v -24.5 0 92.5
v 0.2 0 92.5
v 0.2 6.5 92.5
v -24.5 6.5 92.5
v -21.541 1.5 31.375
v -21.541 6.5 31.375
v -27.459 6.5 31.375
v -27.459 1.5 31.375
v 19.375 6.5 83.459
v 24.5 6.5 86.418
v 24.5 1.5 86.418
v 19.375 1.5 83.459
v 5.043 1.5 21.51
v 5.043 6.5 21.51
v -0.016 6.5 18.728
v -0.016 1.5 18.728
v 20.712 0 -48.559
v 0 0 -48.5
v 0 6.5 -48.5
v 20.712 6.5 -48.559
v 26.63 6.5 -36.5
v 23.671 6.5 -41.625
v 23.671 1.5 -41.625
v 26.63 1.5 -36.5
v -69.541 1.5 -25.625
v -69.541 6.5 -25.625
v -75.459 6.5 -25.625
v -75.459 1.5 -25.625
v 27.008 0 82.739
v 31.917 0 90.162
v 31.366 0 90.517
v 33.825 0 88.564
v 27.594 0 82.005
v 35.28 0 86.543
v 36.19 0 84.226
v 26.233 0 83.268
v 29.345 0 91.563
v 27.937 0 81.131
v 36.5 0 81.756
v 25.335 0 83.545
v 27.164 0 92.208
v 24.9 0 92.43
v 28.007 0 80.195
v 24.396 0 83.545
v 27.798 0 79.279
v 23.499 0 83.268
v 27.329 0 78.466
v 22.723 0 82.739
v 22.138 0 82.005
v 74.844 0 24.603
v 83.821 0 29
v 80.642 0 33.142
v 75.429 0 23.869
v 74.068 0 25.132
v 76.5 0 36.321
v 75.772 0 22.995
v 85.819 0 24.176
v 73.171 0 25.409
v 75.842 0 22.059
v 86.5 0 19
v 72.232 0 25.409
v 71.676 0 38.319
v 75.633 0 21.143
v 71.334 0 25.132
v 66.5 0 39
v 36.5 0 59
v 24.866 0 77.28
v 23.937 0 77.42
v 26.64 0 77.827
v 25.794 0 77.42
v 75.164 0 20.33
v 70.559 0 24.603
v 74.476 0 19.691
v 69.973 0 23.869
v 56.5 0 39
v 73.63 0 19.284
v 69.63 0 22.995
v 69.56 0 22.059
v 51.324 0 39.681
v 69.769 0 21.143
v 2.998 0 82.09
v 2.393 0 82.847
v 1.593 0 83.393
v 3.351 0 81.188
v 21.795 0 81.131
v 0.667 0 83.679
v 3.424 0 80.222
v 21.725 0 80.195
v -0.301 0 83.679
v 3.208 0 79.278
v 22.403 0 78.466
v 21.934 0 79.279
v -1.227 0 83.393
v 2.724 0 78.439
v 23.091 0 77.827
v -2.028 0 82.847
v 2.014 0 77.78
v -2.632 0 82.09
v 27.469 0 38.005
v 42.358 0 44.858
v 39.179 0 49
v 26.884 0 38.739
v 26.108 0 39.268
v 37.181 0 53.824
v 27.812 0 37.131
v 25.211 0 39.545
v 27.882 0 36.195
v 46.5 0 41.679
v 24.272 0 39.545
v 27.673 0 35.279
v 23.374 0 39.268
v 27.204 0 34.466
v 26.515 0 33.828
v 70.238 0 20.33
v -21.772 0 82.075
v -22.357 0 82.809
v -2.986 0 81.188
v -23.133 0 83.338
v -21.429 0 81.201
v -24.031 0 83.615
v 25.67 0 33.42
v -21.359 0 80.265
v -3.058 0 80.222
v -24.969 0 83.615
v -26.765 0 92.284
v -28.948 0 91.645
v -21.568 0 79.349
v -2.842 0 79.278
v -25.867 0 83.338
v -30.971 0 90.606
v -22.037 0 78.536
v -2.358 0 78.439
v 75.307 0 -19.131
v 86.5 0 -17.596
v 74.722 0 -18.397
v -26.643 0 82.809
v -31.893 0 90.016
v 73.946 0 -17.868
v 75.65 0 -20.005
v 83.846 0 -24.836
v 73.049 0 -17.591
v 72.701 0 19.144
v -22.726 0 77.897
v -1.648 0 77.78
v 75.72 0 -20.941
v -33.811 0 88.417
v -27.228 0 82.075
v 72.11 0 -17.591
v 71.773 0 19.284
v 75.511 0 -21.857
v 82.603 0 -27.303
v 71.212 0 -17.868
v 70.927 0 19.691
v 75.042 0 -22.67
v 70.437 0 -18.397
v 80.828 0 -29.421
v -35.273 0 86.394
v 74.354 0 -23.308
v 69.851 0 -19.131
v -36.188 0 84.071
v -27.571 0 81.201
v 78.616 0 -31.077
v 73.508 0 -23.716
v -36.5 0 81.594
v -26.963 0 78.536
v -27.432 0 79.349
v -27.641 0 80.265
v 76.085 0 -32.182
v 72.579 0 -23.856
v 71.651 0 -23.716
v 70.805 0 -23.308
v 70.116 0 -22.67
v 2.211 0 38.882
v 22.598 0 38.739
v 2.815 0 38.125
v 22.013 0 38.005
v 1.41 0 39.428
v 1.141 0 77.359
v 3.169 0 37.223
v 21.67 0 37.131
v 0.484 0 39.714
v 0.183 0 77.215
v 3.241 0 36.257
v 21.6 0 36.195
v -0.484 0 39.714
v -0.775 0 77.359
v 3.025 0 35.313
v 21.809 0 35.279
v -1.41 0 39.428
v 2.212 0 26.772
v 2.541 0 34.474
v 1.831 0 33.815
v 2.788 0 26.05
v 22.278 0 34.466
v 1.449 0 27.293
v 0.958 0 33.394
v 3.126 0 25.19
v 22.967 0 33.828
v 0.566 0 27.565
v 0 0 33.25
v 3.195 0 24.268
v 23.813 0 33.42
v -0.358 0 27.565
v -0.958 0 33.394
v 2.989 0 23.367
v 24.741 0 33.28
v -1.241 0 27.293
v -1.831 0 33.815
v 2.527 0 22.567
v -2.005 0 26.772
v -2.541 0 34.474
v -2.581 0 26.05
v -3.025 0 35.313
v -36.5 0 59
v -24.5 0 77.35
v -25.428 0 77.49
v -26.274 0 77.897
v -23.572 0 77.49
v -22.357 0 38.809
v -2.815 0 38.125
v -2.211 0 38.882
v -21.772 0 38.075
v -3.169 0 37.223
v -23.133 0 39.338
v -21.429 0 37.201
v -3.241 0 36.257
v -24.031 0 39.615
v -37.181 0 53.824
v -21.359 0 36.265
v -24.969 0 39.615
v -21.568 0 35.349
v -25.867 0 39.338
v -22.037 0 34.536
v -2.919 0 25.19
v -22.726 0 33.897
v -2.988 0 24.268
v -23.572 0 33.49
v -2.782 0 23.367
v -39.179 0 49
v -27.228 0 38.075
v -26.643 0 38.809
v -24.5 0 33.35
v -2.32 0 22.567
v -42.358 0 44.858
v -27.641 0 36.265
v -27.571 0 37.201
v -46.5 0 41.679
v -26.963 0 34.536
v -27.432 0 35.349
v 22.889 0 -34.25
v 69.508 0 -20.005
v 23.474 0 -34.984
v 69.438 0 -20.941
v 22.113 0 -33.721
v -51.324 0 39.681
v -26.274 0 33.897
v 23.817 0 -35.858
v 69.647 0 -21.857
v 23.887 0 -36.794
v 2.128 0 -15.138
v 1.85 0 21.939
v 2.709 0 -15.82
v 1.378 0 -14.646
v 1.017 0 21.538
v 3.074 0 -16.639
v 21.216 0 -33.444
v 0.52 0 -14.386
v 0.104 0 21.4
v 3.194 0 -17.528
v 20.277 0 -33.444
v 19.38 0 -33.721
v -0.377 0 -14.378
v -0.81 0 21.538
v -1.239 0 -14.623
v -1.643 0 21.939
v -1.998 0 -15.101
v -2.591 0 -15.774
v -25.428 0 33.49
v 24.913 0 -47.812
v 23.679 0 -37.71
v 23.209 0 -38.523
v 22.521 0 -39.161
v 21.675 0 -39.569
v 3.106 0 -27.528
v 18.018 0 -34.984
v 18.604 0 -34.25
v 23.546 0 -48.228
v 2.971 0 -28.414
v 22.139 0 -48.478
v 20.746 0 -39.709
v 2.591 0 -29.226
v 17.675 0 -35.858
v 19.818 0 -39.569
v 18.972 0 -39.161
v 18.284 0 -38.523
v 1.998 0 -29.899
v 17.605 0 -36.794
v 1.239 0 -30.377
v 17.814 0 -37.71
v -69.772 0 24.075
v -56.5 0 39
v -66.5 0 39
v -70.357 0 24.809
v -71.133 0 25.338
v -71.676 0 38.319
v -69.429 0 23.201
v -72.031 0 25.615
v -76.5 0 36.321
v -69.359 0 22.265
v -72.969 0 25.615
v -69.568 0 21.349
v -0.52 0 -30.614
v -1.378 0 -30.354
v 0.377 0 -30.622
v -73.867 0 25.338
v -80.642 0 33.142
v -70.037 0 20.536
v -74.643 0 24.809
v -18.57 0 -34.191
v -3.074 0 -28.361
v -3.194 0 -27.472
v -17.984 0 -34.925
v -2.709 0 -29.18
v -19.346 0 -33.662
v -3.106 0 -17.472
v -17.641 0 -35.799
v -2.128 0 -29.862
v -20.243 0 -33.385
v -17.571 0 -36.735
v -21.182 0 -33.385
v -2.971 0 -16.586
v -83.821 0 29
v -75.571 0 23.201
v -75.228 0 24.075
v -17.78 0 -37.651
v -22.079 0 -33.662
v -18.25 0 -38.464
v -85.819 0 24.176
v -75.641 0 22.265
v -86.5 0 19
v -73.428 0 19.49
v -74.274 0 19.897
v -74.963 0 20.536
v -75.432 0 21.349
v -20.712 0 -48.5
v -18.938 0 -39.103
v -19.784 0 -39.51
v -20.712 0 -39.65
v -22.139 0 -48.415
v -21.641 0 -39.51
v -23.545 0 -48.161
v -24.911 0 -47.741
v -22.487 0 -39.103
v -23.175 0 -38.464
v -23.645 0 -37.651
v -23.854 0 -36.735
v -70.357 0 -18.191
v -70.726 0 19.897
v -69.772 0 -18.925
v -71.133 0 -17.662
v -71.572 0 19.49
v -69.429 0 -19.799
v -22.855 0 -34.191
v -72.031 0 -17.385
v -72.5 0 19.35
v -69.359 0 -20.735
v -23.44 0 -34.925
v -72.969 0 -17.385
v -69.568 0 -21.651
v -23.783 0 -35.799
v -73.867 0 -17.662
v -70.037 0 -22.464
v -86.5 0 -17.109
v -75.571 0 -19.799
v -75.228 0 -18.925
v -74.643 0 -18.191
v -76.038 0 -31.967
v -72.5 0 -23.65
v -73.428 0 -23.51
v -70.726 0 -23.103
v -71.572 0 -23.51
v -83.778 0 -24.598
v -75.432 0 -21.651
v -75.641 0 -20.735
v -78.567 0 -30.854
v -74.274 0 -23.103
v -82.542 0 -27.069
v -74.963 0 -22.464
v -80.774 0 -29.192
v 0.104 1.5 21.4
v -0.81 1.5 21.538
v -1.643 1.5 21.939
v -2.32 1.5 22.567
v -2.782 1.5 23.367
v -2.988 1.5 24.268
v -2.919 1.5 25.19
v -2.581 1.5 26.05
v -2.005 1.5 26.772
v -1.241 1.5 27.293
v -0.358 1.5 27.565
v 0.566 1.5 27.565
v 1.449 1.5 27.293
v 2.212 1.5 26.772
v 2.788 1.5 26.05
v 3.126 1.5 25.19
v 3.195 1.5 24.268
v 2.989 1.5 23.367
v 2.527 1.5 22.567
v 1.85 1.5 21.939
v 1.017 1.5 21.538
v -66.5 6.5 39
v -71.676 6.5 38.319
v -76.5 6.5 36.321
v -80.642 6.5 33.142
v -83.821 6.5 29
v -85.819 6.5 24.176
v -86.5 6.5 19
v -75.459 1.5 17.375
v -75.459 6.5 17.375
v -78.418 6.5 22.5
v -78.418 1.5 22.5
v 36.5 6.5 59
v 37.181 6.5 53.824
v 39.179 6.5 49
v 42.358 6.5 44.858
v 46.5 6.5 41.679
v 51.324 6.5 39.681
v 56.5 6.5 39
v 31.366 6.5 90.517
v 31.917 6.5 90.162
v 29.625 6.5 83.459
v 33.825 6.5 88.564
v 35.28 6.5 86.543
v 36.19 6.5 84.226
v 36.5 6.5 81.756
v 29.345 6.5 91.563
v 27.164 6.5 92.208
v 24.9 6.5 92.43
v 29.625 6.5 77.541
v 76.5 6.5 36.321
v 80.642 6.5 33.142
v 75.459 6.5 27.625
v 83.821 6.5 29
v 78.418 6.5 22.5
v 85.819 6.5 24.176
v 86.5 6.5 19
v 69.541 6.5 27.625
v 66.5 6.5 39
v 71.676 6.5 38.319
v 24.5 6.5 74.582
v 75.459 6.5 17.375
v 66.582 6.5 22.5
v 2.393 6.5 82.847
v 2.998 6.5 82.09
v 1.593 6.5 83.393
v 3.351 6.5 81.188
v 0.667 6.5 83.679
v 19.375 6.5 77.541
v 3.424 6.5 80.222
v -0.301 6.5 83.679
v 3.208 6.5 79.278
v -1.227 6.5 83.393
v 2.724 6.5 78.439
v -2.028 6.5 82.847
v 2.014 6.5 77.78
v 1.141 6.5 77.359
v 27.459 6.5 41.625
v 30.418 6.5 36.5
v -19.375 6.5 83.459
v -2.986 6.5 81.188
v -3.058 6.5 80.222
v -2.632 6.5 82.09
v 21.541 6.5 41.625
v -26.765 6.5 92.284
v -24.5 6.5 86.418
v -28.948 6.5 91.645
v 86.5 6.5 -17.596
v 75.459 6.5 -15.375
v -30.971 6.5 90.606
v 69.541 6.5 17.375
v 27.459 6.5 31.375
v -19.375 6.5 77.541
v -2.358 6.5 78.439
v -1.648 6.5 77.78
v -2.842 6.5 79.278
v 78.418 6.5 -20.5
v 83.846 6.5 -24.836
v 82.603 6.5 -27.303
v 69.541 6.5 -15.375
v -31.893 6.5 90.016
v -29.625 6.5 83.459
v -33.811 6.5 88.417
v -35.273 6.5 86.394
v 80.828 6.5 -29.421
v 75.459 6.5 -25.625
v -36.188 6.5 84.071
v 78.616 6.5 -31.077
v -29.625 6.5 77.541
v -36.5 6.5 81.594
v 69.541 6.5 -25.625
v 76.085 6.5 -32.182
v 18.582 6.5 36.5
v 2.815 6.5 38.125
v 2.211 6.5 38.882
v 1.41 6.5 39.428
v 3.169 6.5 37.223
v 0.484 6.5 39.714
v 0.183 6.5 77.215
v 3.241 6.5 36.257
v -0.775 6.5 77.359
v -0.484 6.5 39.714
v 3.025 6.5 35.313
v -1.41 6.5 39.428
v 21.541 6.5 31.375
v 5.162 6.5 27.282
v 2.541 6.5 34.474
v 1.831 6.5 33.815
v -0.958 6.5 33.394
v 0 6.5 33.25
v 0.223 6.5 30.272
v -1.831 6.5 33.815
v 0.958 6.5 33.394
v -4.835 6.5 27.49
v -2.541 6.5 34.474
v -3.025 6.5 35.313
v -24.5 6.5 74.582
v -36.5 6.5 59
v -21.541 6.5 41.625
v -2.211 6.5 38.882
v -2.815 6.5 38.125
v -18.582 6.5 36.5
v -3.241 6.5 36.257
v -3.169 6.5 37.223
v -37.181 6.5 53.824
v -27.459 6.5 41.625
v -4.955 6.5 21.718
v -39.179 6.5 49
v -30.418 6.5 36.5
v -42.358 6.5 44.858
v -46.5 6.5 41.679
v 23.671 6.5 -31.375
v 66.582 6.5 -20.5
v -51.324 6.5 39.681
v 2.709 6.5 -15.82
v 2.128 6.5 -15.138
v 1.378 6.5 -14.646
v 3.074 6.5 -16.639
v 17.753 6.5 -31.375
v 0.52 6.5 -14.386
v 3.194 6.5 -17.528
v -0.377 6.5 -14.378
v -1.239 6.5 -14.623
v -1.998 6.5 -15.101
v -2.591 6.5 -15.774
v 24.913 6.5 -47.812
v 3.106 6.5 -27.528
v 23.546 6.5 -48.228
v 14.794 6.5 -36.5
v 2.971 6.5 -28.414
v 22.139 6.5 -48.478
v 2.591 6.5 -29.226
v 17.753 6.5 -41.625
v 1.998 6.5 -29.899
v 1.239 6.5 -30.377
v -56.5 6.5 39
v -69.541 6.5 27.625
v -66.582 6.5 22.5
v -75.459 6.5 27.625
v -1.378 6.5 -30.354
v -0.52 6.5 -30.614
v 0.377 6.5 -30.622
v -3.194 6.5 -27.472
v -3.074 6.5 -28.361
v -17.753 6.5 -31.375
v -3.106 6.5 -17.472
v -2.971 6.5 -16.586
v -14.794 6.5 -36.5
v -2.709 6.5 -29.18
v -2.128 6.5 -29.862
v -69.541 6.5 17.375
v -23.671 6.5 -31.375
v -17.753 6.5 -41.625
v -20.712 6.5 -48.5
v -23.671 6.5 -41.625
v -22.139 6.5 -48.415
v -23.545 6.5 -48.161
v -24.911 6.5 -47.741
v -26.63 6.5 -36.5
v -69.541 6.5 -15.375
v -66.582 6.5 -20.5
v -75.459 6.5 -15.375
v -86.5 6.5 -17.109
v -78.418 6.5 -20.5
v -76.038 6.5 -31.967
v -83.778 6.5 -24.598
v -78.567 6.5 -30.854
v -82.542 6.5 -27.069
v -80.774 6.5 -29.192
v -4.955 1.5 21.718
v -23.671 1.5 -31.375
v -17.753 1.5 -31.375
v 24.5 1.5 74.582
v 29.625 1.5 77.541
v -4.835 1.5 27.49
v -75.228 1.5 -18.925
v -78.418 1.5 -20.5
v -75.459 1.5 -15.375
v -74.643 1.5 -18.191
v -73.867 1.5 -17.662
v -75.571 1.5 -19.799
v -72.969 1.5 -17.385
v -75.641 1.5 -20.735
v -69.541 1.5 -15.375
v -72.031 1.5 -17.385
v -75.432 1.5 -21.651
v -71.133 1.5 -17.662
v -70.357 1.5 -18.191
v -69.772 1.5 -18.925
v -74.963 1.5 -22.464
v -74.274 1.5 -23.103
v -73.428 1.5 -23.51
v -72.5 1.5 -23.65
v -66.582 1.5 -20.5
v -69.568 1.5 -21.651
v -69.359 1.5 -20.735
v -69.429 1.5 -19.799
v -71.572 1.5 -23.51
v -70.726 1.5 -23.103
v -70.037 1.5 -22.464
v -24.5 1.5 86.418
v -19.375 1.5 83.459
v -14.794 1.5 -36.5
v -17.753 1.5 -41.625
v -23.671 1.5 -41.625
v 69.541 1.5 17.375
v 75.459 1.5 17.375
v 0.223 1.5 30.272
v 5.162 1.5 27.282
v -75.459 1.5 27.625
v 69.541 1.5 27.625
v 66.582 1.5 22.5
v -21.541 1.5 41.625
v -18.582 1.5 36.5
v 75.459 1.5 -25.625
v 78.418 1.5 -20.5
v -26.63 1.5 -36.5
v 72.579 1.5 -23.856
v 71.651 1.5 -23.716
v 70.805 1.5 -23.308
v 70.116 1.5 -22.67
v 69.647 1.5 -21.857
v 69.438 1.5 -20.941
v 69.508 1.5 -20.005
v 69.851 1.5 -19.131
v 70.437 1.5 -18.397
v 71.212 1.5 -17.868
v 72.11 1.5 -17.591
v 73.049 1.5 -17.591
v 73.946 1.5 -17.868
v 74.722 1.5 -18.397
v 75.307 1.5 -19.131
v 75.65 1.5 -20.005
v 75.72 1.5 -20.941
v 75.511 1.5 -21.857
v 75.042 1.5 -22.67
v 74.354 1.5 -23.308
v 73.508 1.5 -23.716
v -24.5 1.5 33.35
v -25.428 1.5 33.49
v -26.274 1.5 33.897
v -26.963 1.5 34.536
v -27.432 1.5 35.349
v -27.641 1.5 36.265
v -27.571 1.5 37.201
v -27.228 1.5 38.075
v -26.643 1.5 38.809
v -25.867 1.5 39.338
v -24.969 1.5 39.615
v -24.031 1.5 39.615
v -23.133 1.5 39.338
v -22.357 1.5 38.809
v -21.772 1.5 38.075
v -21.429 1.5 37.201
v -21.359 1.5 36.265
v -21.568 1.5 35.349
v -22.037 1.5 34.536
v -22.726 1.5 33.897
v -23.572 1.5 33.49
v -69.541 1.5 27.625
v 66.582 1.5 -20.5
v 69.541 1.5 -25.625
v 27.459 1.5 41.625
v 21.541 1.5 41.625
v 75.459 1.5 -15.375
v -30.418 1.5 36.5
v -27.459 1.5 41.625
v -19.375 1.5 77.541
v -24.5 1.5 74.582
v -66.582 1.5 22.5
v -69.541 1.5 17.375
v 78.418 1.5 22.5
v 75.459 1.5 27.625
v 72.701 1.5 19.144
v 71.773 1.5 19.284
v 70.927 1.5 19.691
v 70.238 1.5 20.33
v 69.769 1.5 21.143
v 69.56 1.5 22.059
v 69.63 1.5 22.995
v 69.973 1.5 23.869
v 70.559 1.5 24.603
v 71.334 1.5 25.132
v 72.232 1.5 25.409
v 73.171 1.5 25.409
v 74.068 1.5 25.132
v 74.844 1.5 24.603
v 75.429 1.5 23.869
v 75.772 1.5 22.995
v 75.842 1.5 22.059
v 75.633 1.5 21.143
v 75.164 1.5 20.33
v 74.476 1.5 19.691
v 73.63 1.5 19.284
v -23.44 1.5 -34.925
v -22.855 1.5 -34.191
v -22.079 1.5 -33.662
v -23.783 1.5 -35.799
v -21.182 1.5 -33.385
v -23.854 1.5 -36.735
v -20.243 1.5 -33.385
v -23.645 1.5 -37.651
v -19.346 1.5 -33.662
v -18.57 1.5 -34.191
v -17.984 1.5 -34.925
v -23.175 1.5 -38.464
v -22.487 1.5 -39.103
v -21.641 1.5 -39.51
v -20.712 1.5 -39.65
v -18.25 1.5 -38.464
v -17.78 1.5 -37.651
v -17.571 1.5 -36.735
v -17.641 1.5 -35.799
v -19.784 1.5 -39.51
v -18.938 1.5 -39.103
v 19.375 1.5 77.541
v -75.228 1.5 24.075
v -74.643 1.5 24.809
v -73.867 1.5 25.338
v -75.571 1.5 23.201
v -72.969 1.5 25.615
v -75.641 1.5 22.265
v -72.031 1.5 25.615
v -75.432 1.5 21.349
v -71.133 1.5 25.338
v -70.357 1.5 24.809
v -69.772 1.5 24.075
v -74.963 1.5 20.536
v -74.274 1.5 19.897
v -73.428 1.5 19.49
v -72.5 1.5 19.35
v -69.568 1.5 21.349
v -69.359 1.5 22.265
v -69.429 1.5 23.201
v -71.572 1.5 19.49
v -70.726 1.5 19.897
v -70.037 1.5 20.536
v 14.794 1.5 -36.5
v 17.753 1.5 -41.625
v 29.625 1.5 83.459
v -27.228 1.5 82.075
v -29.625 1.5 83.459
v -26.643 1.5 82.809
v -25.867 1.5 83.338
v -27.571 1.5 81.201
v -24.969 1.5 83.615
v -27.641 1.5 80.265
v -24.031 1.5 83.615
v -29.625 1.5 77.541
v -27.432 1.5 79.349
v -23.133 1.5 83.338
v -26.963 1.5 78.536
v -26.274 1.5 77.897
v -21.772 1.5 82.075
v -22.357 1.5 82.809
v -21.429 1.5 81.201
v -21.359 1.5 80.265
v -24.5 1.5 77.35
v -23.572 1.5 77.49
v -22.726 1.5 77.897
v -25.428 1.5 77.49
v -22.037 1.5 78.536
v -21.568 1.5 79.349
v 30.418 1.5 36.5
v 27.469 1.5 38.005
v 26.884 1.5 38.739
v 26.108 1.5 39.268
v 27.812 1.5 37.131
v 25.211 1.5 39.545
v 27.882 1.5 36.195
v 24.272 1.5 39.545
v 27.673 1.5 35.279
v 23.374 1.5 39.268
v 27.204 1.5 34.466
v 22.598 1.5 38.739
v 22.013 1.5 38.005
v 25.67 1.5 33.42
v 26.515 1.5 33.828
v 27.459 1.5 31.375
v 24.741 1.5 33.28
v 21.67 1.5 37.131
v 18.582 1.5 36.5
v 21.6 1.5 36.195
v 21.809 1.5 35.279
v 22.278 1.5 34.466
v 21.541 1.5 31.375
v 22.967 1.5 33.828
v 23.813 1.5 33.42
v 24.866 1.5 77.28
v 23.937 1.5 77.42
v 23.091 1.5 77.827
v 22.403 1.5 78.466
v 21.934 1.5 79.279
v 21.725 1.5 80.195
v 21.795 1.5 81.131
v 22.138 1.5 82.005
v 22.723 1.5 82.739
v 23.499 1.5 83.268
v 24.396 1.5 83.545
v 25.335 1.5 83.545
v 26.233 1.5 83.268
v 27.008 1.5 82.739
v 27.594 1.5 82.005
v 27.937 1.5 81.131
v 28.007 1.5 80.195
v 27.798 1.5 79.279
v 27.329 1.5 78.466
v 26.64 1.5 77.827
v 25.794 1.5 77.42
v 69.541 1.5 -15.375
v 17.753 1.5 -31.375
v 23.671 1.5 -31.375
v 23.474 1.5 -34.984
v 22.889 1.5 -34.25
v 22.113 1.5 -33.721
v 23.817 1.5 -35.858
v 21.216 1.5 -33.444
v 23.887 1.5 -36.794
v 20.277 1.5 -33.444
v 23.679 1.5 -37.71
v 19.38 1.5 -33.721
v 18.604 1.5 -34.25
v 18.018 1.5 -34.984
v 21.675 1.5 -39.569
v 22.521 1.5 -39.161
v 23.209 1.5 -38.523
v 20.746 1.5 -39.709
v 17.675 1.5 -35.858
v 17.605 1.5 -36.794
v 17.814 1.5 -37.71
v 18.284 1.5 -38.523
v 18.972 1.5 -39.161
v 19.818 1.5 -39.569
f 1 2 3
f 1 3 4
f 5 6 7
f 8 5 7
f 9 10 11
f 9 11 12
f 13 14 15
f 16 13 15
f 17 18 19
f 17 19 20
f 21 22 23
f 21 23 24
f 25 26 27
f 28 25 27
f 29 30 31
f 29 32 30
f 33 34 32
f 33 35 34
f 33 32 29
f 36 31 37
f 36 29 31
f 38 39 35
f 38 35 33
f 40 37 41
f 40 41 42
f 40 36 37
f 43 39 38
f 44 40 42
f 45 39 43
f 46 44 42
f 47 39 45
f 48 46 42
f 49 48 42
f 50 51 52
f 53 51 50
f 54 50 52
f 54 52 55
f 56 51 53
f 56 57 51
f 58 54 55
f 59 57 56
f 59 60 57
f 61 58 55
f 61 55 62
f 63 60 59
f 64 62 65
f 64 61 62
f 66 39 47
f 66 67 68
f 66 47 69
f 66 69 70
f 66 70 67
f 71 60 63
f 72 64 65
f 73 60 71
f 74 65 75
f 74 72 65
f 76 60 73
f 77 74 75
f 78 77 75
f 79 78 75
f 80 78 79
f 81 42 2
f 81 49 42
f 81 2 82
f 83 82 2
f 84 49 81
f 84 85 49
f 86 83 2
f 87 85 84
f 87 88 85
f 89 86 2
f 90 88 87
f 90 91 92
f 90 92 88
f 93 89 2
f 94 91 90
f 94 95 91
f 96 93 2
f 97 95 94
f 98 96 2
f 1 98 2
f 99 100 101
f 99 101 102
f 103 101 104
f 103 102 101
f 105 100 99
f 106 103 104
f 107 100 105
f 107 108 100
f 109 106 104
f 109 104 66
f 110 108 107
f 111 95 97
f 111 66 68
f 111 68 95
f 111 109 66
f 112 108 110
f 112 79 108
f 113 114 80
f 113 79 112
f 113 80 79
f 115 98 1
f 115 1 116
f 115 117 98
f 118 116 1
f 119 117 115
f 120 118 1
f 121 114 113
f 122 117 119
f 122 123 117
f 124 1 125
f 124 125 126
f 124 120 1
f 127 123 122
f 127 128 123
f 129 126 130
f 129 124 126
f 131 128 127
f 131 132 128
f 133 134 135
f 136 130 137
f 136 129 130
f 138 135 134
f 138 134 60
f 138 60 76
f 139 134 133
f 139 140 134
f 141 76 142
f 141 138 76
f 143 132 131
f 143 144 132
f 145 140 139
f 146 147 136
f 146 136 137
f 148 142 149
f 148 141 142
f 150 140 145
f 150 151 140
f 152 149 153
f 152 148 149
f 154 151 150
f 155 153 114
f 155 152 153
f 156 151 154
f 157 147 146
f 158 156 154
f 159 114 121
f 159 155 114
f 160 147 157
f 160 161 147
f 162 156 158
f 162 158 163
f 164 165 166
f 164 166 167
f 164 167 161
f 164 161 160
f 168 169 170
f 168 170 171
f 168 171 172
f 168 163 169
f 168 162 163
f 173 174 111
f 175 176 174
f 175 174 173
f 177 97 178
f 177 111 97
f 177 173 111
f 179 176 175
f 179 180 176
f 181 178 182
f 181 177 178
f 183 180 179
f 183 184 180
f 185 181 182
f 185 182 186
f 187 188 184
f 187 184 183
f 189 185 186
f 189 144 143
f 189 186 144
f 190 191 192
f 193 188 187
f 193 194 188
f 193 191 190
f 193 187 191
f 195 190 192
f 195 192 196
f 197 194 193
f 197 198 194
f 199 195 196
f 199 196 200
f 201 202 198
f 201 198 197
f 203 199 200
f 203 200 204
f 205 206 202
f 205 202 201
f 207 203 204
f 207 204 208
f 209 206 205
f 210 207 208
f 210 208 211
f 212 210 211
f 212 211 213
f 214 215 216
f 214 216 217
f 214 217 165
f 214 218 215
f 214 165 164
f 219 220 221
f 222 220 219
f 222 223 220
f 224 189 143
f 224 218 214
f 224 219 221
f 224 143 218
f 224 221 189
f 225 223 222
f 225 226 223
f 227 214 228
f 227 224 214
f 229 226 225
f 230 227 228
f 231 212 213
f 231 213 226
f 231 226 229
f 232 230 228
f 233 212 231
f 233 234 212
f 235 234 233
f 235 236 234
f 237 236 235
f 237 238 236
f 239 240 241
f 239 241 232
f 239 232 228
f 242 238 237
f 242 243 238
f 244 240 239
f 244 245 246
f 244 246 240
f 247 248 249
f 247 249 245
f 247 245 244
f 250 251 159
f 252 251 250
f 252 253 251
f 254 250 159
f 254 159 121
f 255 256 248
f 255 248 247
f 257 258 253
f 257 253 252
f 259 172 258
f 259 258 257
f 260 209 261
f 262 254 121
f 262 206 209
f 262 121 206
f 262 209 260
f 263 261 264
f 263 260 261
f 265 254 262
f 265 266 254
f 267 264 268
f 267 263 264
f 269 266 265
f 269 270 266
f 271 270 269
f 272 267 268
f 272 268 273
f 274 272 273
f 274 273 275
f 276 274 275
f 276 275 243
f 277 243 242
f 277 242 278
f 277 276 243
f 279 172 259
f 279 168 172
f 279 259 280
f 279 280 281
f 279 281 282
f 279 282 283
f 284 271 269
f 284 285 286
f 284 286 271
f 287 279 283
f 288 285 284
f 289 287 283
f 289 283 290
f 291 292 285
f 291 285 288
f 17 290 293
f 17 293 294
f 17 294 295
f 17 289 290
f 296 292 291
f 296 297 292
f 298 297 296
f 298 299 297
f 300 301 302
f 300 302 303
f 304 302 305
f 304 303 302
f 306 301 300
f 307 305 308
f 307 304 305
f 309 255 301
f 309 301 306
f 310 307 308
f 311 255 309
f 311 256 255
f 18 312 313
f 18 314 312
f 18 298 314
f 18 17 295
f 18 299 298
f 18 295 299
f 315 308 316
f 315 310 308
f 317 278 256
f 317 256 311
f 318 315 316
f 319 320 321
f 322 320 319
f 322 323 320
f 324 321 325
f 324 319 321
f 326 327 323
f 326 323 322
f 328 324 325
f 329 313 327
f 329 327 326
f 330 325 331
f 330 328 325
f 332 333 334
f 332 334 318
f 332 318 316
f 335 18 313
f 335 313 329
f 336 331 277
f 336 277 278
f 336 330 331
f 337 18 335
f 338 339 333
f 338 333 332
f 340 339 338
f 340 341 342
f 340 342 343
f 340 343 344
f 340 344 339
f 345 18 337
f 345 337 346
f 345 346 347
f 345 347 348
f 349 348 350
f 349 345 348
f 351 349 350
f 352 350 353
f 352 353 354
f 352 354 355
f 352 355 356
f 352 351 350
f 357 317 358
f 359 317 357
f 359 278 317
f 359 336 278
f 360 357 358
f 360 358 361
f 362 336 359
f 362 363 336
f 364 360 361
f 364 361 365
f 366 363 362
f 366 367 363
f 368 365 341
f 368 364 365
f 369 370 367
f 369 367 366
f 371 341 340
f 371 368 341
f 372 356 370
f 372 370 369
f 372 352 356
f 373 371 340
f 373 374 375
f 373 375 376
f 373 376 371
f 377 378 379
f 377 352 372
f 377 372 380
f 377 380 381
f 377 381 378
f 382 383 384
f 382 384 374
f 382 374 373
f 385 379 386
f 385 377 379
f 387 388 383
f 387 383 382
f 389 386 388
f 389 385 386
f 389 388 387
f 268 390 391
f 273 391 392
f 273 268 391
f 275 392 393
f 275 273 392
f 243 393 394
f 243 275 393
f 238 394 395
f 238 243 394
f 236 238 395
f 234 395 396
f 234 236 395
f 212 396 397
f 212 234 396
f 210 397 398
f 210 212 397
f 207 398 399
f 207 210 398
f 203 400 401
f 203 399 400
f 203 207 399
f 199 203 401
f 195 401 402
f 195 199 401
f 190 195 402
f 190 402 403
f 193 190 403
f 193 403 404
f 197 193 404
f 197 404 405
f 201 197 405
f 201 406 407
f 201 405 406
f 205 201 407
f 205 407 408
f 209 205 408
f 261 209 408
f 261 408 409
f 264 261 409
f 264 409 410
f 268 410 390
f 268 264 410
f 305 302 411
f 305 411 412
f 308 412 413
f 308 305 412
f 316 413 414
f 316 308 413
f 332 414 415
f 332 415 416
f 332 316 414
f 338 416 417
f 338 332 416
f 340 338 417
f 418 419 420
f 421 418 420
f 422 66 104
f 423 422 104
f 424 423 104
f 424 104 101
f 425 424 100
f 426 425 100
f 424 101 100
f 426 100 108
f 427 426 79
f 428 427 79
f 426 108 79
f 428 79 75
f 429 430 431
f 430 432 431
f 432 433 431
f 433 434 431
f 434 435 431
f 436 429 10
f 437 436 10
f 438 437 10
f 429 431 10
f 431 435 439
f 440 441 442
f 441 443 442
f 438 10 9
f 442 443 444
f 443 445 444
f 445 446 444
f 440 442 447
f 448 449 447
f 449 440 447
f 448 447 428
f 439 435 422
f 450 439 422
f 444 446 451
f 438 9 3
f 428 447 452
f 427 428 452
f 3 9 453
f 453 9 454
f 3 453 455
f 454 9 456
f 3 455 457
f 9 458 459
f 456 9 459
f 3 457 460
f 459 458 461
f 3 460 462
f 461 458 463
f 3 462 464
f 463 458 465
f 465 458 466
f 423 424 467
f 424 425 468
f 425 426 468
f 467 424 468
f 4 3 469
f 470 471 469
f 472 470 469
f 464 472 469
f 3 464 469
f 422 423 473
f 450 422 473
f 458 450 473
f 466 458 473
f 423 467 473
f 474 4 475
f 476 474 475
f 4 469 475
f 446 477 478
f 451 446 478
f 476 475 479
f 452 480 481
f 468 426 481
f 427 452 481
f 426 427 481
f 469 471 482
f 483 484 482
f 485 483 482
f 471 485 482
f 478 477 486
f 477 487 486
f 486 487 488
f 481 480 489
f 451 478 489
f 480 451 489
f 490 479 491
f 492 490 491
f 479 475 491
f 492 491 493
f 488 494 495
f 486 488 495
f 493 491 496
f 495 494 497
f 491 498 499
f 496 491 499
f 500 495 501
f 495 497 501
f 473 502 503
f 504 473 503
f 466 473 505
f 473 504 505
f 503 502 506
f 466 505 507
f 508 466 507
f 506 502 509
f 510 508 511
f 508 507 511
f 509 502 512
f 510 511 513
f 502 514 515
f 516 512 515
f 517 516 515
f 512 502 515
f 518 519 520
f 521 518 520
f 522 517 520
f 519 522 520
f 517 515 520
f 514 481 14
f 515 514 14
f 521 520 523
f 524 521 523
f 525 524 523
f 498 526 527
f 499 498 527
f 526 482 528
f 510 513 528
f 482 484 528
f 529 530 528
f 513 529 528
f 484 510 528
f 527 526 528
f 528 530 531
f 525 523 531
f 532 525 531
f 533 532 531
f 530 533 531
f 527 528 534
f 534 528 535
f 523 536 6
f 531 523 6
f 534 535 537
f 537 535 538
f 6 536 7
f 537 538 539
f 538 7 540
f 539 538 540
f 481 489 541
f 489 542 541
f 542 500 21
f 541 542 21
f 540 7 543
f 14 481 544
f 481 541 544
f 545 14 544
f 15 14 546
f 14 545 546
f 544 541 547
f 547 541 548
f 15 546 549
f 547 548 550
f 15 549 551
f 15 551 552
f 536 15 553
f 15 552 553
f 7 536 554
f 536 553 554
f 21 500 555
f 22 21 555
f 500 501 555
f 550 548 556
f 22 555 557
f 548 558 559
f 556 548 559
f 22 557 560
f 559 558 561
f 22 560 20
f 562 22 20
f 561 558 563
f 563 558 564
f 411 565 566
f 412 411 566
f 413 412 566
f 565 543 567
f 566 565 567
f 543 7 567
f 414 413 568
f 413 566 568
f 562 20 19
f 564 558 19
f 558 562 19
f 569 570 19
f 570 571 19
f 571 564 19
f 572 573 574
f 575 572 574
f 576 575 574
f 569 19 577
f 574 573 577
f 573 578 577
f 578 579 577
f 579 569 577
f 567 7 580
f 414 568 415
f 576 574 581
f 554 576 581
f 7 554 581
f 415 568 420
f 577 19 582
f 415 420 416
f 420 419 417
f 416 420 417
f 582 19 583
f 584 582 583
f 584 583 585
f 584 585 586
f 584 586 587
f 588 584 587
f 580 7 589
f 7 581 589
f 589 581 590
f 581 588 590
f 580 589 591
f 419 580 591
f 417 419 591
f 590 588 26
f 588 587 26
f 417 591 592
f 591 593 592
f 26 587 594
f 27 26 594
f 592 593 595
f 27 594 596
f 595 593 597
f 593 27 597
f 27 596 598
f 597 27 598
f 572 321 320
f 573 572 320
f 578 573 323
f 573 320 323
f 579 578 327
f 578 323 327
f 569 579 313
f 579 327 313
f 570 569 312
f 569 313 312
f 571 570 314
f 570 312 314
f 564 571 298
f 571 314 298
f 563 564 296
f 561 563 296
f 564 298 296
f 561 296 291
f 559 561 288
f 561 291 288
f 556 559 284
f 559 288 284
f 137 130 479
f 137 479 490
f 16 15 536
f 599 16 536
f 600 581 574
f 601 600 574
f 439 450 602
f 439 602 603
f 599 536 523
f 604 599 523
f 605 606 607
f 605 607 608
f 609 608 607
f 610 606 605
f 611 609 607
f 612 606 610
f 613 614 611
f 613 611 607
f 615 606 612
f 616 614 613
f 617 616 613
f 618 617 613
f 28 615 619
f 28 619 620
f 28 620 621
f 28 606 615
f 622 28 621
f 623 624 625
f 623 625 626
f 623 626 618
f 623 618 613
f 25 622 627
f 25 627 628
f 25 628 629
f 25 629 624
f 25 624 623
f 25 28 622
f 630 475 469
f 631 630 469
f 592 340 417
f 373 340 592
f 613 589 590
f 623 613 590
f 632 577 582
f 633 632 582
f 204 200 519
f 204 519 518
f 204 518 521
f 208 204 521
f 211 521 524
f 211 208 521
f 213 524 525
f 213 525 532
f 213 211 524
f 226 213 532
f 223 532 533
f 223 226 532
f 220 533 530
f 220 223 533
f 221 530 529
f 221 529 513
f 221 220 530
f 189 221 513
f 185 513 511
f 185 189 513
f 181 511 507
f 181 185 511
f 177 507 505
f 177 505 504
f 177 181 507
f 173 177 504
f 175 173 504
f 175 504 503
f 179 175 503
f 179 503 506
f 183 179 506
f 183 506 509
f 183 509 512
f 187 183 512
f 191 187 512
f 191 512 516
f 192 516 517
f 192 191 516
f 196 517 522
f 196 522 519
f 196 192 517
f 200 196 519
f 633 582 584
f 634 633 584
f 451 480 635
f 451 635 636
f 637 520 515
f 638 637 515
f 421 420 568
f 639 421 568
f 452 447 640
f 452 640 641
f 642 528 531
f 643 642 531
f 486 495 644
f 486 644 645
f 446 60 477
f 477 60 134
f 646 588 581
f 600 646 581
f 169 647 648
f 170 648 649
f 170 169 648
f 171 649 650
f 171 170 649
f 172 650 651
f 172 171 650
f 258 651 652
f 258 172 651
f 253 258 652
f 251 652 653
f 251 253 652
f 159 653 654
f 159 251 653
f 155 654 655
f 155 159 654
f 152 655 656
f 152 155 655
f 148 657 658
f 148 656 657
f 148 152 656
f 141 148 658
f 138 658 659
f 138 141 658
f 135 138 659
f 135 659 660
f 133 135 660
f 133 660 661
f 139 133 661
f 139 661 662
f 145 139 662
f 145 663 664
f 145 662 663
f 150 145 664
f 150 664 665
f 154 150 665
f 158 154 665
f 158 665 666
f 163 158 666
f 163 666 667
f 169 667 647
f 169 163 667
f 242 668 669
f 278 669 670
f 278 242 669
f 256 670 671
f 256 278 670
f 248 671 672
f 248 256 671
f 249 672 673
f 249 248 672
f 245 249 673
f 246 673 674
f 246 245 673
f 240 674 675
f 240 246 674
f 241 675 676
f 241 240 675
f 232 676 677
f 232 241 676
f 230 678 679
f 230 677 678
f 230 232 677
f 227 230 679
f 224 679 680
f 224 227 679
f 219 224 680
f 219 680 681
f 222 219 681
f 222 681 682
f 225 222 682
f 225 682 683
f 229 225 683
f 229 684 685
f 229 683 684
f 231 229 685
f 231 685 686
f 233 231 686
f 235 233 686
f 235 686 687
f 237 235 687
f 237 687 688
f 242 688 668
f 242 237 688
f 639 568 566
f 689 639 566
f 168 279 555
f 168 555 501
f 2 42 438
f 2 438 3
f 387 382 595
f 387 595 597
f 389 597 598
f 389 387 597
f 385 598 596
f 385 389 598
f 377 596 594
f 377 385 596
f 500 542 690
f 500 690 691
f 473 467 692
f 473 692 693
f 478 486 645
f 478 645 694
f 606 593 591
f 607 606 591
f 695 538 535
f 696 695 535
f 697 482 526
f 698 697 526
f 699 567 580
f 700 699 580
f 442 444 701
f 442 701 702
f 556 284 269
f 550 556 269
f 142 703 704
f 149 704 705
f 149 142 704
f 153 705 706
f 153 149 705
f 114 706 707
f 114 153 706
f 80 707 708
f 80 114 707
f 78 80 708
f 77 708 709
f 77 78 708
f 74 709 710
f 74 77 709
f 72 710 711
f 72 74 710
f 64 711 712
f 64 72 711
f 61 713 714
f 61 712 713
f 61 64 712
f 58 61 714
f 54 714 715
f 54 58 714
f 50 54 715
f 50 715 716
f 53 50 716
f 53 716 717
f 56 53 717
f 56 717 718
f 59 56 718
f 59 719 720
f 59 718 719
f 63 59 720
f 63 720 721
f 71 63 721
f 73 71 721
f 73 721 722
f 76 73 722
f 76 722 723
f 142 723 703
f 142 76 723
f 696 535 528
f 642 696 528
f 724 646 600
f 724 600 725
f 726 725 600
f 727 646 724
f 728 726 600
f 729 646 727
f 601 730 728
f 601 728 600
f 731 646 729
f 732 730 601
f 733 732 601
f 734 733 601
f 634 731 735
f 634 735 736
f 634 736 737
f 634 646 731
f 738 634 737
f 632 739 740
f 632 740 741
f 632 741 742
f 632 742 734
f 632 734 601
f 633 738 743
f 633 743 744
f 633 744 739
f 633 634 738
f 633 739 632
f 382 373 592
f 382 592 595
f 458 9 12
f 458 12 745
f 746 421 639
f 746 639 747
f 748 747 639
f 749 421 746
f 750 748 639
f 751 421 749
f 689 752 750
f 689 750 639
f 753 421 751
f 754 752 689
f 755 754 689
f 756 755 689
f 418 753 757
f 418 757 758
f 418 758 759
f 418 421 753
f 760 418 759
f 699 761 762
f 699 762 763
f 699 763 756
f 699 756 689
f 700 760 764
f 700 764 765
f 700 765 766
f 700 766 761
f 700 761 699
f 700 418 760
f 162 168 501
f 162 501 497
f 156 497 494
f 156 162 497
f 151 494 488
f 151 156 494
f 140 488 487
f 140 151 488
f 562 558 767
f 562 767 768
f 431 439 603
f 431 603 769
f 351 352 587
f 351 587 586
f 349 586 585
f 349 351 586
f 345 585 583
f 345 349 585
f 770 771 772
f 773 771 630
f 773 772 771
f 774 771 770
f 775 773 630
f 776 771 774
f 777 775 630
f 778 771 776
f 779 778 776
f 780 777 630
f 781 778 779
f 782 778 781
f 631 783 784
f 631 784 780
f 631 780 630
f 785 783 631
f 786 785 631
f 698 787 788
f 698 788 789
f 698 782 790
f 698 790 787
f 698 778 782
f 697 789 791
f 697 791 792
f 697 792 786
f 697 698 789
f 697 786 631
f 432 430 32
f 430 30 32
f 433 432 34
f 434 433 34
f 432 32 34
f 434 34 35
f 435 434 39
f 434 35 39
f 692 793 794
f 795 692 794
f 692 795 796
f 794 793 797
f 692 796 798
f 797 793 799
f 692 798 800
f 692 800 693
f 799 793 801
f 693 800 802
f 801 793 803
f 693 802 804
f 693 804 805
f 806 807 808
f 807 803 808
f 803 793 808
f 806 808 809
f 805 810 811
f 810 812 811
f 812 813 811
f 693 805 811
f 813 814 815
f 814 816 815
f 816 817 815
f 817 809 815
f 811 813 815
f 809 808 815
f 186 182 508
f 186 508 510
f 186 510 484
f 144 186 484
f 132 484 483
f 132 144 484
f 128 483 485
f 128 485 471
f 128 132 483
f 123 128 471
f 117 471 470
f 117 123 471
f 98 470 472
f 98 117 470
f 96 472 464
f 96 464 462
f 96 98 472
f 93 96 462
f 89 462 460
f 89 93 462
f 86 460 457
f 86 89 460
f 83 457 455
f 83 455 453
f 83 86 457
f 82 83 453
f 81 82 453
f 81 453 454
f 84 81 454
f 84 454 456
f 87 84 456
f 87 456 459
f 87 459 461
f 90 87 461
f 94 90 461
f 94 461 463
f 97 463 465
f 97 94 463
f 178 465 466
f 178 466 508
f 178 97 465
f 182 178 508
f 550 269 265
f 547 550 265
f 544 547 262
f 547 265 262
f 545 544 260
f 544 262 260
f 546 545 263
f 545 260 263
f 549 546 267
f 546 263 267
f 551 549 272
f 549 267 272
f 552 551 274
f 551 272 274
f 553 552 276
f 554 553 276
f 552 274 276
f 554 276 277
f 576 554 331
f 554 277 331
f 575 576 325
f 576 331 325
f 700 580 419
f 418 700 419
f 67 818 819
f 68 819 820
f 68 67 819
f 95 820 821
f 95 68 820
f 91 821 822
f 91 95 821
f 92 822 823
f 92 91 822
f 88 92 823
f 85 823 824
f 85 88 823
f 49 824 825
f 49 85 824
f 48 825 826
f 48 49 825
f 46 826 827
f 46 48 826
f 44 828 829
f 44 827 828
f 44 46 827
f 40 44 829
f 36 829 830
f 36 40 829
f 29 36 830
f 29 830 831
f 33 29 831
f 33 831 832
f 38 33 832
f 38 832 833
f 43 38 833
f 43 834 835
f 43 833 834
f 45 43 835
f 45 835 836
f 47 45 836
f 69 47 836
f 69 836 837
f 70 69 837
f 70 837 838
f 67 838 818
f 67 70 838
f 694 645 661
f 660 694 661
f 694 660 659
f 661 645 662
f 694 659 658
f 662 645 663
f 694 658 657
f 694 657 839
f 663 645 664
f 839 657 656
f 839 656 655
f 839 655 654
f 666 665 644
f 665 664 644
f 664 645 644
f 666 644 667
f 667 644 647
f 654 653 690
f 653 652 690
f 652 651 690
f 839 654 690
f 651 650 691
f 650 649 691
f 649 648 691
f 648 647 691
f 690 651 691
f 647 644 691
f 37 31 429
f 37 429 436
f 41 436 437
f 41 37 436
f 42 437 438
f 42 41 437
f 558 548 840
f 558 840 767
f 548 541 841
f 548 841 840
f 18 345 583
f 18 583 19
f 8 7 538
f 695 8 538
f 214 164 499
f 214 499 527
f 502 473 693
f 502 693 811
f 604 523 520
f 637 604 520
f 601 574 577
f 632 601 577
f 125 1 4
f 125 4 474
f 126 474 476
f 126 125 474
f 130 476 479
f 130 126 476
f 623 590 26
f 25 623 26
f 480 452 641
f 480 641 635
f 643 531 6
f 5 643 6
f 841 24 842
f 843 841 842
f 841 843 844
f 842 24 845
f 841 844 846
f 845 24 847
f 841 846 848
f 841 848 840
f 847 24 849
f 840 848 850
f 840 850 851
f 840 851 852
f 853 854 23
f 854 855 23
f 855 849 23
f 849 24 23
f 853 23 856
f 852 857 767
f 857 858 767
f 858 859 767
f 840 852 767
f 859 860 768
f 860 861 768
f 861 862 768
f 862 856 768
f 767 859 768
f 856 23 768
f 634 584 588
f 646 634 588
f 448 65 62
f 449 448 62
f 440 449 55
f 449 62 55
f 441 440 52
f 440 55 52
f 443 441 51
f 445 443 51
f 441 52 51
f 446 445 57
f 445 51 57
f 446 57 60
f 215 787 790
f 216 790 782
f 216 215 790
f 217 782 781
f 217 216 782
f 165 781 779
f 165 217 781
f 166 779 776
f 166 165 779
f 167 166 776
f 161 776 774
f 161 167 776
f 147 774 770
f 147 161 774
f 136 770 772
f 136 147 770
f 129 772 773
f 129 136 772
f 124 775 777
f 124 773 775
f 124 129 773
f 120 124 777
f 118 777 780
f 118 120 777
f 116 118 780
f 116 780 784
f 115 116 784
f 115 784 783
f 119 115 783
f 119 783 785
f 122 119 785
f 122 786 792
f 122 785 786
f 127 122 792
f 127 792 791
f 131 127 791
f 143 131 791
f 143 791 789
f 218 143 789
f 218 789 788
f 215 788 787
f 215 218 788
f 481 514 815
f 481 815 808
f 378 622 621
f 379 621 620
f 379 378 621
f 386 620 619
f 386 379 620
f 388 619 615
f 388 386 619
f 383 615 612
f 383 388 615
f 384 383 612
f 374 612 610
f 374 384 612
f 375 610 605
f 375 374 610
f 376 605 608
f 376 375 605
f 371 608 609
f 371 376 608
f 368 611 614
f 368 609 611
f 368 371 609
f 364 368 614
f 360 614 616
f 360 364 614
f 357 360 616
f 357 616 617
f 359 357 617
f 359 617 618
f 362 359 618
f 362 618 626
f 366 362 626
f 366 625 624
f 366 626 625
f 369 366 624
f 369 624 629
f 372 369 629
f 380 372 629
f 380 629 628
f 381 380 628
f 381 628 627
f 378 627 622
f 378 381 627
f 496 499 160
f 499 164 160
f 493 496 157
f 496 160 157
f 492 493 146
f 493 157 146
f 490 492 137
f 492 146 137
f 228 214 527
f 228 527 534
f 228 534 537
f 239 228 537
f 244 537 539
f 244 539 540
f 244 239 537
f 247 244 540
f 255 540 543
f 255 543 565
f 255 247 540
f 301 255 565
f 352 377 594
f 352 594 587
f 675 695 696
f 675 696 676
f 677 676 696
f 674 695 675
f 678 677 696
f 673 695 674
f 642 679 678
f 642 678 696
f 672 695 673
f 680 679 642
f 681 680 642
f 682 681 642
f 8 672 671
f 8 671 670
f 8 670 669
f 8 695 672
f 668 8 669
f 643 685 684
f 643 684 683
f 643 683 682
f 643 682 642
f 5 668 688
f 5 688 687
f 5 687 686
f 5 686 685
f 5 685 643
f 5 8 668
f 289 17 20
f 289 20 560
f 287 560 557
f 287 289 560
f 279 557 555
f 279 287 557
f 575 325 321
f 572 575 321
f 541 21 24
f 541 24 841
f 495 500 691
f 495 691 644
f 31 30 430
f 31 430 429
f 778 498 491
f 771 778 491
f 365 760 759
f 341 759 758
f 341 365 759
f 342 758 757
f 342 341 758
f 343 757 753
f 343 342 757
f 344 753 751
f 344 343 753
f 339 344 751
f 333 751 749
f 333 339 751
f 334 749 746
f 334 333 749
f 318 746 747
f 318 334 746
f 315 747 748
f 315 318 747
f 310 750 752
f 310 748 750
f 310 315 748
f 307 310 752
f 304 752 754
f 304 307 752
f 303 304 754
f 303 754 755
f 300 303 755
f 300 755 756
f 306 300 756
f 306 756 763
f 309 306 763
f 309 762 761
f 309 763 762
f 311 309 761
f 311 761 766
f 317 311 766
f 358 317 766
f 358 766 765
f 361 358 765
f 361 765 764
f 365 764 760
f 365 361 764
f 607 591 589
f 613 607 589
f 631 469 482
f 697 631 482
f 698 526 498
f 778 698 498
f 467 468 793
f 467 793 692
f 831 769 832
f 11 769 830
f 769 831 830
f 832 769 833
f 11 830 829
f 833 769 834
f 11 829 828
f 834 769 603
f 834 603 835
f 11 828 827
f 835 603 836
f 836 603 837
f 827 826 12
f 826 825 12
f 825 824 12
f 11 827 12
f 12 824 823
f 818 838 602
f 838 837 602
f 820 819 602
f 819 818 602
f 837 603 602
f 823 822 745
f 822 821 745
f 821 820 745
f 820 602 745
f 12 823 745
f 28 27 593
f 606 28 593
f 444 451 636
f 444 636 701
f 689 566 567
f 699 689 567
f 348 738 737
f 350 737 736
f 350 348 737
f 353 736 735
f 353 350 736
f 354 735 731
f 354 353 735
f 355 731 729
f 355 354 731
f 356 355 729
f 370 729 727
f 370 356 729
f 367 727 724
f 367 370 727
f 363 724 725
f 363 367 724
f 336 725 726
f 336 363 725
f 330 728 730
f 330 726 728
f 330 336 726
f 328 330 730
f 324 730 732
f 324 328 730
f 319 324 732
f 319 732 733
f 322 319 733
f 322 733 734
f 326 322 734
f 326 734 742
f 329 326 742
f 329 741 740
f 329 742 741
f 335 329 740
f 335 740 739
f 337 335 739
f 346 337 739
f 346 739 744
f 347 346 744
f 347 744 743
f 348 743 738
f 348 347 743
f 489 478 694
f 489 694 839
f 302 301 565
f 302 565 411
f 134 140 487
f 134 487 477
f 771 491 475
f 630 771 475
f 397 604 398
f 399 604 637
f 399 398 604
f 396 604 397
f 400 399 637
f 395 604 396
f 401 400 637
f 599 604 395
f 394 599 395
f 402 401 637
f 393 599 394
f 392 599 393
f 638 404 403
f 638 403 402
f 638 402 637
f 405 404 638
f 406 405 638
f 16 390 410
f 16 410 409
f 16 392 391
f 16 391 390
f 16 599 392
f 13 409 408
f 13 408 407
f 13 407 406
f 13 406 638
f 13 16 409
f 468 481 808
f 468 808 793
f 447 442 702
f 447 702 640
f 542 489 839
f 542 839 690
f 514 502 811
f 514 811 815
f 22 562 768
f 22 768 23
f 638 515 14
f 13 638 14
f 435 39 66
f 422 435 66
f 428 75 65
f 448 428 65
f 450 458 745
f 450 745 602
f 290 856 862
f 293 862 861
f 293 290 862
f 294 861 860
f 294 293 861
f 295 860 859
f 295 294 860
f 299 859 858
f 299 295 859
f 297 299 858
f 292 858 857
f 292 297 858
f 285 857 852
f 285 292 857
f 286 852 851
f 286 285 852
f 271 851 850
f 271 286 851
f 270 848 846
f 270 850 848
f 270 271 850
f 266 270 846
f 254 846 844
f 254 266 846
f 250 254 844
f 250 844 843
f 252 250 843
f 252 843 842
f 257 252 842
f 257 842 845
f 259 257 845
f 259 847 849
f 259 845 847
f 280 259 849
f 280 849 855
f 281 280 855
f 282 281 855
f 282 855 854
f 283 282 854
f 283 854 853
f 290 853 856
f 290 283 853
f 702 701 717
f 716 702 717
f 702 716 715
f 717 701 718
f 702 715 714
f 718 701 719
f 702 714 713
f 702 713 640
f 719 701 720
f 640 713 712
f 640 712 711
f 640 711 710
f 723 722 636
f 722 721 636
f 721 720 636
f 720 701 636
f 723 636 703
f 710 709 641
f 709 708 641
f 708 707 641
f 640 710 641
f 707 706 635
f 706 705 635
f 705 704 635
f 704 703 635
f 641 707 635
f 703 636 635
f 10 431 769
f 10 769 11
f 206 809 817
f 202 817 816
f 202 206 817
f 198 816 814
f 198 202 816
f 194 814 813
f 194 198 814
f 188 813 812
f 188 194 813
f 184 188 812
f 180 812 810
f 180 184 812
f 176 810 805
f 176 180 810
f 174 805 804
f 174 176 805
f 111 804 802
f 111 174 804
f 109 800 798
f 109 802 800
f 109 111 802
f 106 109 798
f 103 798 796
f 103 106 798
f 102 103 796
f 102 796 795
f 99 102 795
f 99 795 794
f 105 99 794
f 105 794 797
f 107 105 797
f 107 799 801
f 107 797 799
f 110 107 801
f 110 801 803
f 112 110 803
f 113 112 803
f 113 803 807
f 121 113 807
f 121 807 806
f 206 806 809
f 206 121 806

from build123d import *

# Parameters (mm, degrees)
SKETCH2_R          = 3.15
SKETCH2_R_2        = 3.25
SKETCH2_R_3        = 3.1
MAINPLATE_DEPTH    = 6.5
PRESSFITNUTS_DEPTH = 5
CUT_EXTRUDE2_DEPTH = 6.5
FILLET2_R          = 10


with BuildPart() as part:
    # Sketch2 → MainPlate (new body)
    with BuildSketch(Plane(origin=(0, 0, 0), x_dir=(1, 0, 0), z_dir=(0, 1, 0))):
        with BuildLine():
            Line((24.899900609, -92.429929219), (0.2, -92.5))
            Line((0.2, -92.5), (-24.5, -92.5))
            ThreePointArc((-24.5, -92.5), (-27.871368271, -92.016678166), (-30.971160559, -90.605645997))
            Line((-30.971160559, -90.605645997), (-99.683475736, -46.605645997))
            ThreePointArc((-99.683475736, -46.605645997), (-104.578950448, -40.347025165), (-104.490786491, -32.401697323))
            Line((-104.490786491, -32.401697323), (-83.778471314, 24.598302677))
            ThreePointArc((-83.778471314, 24.598302677), (-80.773721892, 29.191692934), (-76.037940173, 31.966602781))
            Line((-76.037940173, 31.966602781), (-24.911380811, 47.741345462))
            ThreePointArc((-24.911380811, 47.741345462), (-22.845839779, 48.308813352), (-20.712315177, 48.5))
            Line((-20.712315177, 48.5), (0, 48.5))
            Line((0, 48.5), (20.712231832, 48.558758223))
            ThreePointArc((20.712231832, 48.558758223), (22.846290221, 48.373624884), (24.913432777, 47.812018957))
            Line((24.913432777, 47.812018957), (76.084537362, 32.182379345))
            ThreePointArc((76.084537362, 32.182379345), (80.828172093, 29.420915478), (83.845940292, 24.836067799))
            Line((83.845940292, 24.836067799), (104.719873926, -32.104944614))
            ThreePointArc((104.719873926, -32.104944614), (104.830577421, -40.049990373), (99.952877324, -46.322473865))
            Line((99.952877324, -46.322473865), (31.365661085, -90.517224974))
            ThreePointArc((31.365661085, -90.517224974), (28.26988419, -91.937045184), (24.899900609, -92.429929219))
        make_face()
        with Locations(Location((-72.5, 20.5, 0), (0, 0, 90))):
            Circle(SKETCH2_R, mode=Mode.SUBTRACT)
        with Locations(Location((-20.712315177, 36.5, 0), (0, 0, 90))):
            Circle(SKETCH2_R, mode=Mode.SUBTRACT)
        with Locations(Location((-93.212315177, -36.5, 0), (0, 0, 90))):
            Circle(SKETCH2_R, mode=Mode.SUBTRACT)
        with Locations(Location((-58.856157589, -58.5, 0), (0, 0, 90))):
            Circle(SKETCH2_R, mode=Mode.SUBTRACT)
        with Locations(Location((-24.5, -80.5, 0), (0, 0, 90))):
            Circle(SKETCH2_R, mode=Mode.SUBTRACT)
        with Locations(Location((-24.5, -36.5, 0), (0, 0, 90))):
            Circle(SKETCH2_R, mode=Mode.SUBTRACT)
        with Locations(Location((-72.5, -22.5, 0), (0, 0, 90))):
            Circle(SKETCH2_R, mode=Mode.SUBTRACT)
        with Locations(Location((24.74103568, -36.430154559, 0), (0, 0, 90))):
            Circle(SKETCH2_R, mode=Mode.SUBTRACT)
        with Locations(Location((24.865858124, -80.429977506, 0), (0, 0, 90))):
            Circle(SKETCH2_R, mode=Mode.SUBTRACT)
        with Locations(Location((59.159466244, -58.332601952, 0), (0, 0, 90))):
            Circle(SKETCH2_R, mode=Mode.SUBTRACT)
        with Locations(Location((93.453074364, -36.235226398, 0), (0, 0, 90))):
            Circle(SKETCH2_R, mode=Mode.SUBTRACT)
        with Locations(Location((72.701126299, -22.294040956, 0), (0, 0, 90))):
            Circle(SKETCH2_R, mode=Mode.SUBTRACT)
        with Locations(Location((72.579140729, 20.705786015, 0), (0, 0, 90))):
            Circle(SKETCH2_R, mode=Mode.SUBTRACT)
        with Locations(Location((20.746274317, 36.55880651, 0), (0, 0, 90))):
            Circle(SKETCH2_R, mode=Mode.SUBTRACT)
        with Locations(Location((0, -36.5, 0), (0, 0, 90))):
            Circle(SKETCH2_R_2, mode=Mode.SUBTRACT)
        with Locations(Location((0.182929062, -80.464988753, 0), (0, 0, 90))):
            Circle(SKETCH2_R_2, mode=Mode.SUBTRACT)
        with Locations(Location((0.103546099, -24.5, 0), (0, 0, 90))):
            Circle(SKETCH2_R_3, mode=Mode.SUBTRACT)
        with BuildLine():
            Line((3.105906565, 27.527701056), (3.193849827, 17.527701056))
            ThreePointArc((3.193849827, 17.527701056), (0.071672688, 14.350121804), (-3.105906565, 17.472298944))
            Line((-3.105906565, 17.472298944), (-3.193849827, 27.472298944))
            ThreePointArc((-3.193849827, 27.472298944), (-0.071672688, 30.649878196), (3.105906565, 27.527701056))
        make_face(mode=Mode.SUBTRACT)
    extrude(amount=MAINPLATE_DEPTH)

    # Sketch8 → PressFitNuts (cut)
    with BuildSketch(Plane(origin=(0, 6.5, 0), x_dir=(1, 0, 0), z_dir=(0, 1, 0))):
        Polygon((-4.835460238, -27.48990798), (0.223379197, -30.272258948), (5.162385534, -27.282350968), (5.042552437, -21.51009202), (-0.016286998, -18.727741052), (-4.955293335, -21.717649032), align=None)
        Polygon((-18.582159741, -36.5), (-21.54107987, -31.375), (-27.45892013, -31.375), (-30.417840259, -36.5), (-27.45892013, -41.625), (-21.54107987, -41.625), align=None)
        Polygon((-66.582159741, -22.5), (-69.54107987, -17.375), (-75.45892013, -17.375), (-78.417840259, -22.5), (-75.45892013, -27.625), (-69.54107987, -27.625), align=None)
        Polygon((-66.582159741, 20.5), (-69.54107987, 25.625), (-75.45892013, 25.625), (-78.417840259, 20.5), (-75.45892013, 15.375), (-69.54107987, 15.375), align=None)
        Polygon((-87.294474918, -36.5), (-90.253395048, -31.375), (-96.171235307, -31.375), (-99.130155436, -36.5), (-96.171235307, -41.625), (-90.253395048, -41.625), align=None)
        Polygon((-52.938317329, -58.5), (-55.897237459, -53.375), (-61.815077718, -53.375), (-64.773997848, -58.5), (-61.815077718, -63.625), (-55.897237459, -63.625), align=None)
        Polygon((-24.5, -74.582159741), (-29.625, -77.54107987), (-29.625, -83.45892013), (-24.5, -86.417840259), (-19.375, -83.45892013), (-19.375, -77.54107987), align=None)
        Polygon((-14.794474918, 36.5), (-17.753395048, 41.625), (-23.671235307, 41.625), (-26.630155436, 36.5), (-23.671235307, 31.375), (-17.753395048, 31.375), align=None)
        Polygon((17.753395048, 31.375), (14.794474918, 36.5), (17.753395048, 41.625), (23.671235307, 41.625), (26.630155436, 36.5), (23.671235307, 31.375), align=None)
        Polygon((19.375, -77.54107987), (24.5, -74.582159741), (29.625, -77.54107987), (29.625, -83.45892013), (24.5, -86.417840259), (19.375, -83.45892013), align=None)
        Polygon((55.897237459, -63.625), (52.938317329, -58.5), (55.897237459, -53.375), (61.815077718, -53.375), (64.773997848, -58.5), (61.815077718, -63.625), align=None)
        Polygon((90.253395048, -41.625), (87.294474918, -36.5), (90.253395048, -31.375), (96.171235307, -31.375), (99.130155436, -36.5), (96.171235307, -41.625), align=None)
        Polygon((69.54107987, 15.375), (66.582159741, 20.5), (69.54107987, 25.625), (75.45892013, 25.625), (78.417840259, 20.5), (75.45892013, 15.375), align=None)
        Polygon((69.54107987, -27.625), (66.582159741, -22.5), (69.54107987, -17.375), (75.45892013, -17.375), (78.417840259, -22.5), (75.45892013, -27.625), align=None)
        Polygon((21.54107987, -41.625), (18.582159741, -36.5), (21.54107987, -31.375), (27.45892013, -31.375), (30.417840259, -36.5), (27.45892013, -41.625), align=None)
    extrude(amount=-PRESSFITNUTS_DEPTH, mode=Mode.SUBTRACT)

    # Sketch11 → Cut-Extrude2 (cut)
    with BuildSketch(Plane(origin=(0, 0, 0), x_dir=(1, 0, 0), z_dir=(0, 1, 0))):
        with BuildLine():
            Line((-111.9, 4.5), (-111.9, -116.15))
            Line((-111.9, -116.15), (-86.5, -116.15))
            Line((-86.5, -116.15), (-36.5, -116.15))
            Line((-36.5, -116.15), (-36.5, -59))
            ThreePointArc((-36.5, -59), (-42.357864376, -44.857864376), (-56.5, -39))
            Line((-56.5, -39), (-66.5, -39))
            ThreePointArc((-66.5, -39), (-80.642135624, -33.142135624), (-86.5, -19))
            Line((-86.5, -19), (-86.5, 4.5))
            Line((-86.5, 4.5), (-86.5, 44.576396133))
            Line((-86.5, 44.576396133), (-111.9, 44.576396133))
            Line((-111.9, 44.576396133), (-111.9, 4.5))
        make_face()
        with BuildLine():
            Line((86.5, 4.5), (86.5, 44.576396133))
            Line((86.5, 44.576396133), (111.9, 44.576396133))
            Line((111.9, 44.576396133), (111.9, 4.5))
            Line((111.9, 4.5), (111.9, -116.15))
            Line((111.9, -116.15), (86.5, -116.15))
            Line((86.5, -116.15), (36.5, -116.15))
            Line((36.5, -116.15), (36.5, -59))
            ThreePointArc((36.5, -59), (42.357864376, -44.857864376), (56.5, -39))
            Line((56.5, -39), (66.5, -39))
            ThreePointArc((66.5, -39), (80.642135624, -33.142135624), (86.5, -19))
            Line((86.5, -19), (86.5, 4.5))
        make_face()
    extrude(amount=CUT_EXTRUDE2_DEPTH, mode=Mode.SUBTRACT)

    # Fillet2
    fillet2_edges = [part.edges().sort_by_distance(p)[0] for p in [
        (36.5, 3.25, 87.208870401),
        (-36.5, 3.25, 87.065248111),
    ]]
    fillet(fillet2_edges, radius=FILLET2_R)


solid = part.part
